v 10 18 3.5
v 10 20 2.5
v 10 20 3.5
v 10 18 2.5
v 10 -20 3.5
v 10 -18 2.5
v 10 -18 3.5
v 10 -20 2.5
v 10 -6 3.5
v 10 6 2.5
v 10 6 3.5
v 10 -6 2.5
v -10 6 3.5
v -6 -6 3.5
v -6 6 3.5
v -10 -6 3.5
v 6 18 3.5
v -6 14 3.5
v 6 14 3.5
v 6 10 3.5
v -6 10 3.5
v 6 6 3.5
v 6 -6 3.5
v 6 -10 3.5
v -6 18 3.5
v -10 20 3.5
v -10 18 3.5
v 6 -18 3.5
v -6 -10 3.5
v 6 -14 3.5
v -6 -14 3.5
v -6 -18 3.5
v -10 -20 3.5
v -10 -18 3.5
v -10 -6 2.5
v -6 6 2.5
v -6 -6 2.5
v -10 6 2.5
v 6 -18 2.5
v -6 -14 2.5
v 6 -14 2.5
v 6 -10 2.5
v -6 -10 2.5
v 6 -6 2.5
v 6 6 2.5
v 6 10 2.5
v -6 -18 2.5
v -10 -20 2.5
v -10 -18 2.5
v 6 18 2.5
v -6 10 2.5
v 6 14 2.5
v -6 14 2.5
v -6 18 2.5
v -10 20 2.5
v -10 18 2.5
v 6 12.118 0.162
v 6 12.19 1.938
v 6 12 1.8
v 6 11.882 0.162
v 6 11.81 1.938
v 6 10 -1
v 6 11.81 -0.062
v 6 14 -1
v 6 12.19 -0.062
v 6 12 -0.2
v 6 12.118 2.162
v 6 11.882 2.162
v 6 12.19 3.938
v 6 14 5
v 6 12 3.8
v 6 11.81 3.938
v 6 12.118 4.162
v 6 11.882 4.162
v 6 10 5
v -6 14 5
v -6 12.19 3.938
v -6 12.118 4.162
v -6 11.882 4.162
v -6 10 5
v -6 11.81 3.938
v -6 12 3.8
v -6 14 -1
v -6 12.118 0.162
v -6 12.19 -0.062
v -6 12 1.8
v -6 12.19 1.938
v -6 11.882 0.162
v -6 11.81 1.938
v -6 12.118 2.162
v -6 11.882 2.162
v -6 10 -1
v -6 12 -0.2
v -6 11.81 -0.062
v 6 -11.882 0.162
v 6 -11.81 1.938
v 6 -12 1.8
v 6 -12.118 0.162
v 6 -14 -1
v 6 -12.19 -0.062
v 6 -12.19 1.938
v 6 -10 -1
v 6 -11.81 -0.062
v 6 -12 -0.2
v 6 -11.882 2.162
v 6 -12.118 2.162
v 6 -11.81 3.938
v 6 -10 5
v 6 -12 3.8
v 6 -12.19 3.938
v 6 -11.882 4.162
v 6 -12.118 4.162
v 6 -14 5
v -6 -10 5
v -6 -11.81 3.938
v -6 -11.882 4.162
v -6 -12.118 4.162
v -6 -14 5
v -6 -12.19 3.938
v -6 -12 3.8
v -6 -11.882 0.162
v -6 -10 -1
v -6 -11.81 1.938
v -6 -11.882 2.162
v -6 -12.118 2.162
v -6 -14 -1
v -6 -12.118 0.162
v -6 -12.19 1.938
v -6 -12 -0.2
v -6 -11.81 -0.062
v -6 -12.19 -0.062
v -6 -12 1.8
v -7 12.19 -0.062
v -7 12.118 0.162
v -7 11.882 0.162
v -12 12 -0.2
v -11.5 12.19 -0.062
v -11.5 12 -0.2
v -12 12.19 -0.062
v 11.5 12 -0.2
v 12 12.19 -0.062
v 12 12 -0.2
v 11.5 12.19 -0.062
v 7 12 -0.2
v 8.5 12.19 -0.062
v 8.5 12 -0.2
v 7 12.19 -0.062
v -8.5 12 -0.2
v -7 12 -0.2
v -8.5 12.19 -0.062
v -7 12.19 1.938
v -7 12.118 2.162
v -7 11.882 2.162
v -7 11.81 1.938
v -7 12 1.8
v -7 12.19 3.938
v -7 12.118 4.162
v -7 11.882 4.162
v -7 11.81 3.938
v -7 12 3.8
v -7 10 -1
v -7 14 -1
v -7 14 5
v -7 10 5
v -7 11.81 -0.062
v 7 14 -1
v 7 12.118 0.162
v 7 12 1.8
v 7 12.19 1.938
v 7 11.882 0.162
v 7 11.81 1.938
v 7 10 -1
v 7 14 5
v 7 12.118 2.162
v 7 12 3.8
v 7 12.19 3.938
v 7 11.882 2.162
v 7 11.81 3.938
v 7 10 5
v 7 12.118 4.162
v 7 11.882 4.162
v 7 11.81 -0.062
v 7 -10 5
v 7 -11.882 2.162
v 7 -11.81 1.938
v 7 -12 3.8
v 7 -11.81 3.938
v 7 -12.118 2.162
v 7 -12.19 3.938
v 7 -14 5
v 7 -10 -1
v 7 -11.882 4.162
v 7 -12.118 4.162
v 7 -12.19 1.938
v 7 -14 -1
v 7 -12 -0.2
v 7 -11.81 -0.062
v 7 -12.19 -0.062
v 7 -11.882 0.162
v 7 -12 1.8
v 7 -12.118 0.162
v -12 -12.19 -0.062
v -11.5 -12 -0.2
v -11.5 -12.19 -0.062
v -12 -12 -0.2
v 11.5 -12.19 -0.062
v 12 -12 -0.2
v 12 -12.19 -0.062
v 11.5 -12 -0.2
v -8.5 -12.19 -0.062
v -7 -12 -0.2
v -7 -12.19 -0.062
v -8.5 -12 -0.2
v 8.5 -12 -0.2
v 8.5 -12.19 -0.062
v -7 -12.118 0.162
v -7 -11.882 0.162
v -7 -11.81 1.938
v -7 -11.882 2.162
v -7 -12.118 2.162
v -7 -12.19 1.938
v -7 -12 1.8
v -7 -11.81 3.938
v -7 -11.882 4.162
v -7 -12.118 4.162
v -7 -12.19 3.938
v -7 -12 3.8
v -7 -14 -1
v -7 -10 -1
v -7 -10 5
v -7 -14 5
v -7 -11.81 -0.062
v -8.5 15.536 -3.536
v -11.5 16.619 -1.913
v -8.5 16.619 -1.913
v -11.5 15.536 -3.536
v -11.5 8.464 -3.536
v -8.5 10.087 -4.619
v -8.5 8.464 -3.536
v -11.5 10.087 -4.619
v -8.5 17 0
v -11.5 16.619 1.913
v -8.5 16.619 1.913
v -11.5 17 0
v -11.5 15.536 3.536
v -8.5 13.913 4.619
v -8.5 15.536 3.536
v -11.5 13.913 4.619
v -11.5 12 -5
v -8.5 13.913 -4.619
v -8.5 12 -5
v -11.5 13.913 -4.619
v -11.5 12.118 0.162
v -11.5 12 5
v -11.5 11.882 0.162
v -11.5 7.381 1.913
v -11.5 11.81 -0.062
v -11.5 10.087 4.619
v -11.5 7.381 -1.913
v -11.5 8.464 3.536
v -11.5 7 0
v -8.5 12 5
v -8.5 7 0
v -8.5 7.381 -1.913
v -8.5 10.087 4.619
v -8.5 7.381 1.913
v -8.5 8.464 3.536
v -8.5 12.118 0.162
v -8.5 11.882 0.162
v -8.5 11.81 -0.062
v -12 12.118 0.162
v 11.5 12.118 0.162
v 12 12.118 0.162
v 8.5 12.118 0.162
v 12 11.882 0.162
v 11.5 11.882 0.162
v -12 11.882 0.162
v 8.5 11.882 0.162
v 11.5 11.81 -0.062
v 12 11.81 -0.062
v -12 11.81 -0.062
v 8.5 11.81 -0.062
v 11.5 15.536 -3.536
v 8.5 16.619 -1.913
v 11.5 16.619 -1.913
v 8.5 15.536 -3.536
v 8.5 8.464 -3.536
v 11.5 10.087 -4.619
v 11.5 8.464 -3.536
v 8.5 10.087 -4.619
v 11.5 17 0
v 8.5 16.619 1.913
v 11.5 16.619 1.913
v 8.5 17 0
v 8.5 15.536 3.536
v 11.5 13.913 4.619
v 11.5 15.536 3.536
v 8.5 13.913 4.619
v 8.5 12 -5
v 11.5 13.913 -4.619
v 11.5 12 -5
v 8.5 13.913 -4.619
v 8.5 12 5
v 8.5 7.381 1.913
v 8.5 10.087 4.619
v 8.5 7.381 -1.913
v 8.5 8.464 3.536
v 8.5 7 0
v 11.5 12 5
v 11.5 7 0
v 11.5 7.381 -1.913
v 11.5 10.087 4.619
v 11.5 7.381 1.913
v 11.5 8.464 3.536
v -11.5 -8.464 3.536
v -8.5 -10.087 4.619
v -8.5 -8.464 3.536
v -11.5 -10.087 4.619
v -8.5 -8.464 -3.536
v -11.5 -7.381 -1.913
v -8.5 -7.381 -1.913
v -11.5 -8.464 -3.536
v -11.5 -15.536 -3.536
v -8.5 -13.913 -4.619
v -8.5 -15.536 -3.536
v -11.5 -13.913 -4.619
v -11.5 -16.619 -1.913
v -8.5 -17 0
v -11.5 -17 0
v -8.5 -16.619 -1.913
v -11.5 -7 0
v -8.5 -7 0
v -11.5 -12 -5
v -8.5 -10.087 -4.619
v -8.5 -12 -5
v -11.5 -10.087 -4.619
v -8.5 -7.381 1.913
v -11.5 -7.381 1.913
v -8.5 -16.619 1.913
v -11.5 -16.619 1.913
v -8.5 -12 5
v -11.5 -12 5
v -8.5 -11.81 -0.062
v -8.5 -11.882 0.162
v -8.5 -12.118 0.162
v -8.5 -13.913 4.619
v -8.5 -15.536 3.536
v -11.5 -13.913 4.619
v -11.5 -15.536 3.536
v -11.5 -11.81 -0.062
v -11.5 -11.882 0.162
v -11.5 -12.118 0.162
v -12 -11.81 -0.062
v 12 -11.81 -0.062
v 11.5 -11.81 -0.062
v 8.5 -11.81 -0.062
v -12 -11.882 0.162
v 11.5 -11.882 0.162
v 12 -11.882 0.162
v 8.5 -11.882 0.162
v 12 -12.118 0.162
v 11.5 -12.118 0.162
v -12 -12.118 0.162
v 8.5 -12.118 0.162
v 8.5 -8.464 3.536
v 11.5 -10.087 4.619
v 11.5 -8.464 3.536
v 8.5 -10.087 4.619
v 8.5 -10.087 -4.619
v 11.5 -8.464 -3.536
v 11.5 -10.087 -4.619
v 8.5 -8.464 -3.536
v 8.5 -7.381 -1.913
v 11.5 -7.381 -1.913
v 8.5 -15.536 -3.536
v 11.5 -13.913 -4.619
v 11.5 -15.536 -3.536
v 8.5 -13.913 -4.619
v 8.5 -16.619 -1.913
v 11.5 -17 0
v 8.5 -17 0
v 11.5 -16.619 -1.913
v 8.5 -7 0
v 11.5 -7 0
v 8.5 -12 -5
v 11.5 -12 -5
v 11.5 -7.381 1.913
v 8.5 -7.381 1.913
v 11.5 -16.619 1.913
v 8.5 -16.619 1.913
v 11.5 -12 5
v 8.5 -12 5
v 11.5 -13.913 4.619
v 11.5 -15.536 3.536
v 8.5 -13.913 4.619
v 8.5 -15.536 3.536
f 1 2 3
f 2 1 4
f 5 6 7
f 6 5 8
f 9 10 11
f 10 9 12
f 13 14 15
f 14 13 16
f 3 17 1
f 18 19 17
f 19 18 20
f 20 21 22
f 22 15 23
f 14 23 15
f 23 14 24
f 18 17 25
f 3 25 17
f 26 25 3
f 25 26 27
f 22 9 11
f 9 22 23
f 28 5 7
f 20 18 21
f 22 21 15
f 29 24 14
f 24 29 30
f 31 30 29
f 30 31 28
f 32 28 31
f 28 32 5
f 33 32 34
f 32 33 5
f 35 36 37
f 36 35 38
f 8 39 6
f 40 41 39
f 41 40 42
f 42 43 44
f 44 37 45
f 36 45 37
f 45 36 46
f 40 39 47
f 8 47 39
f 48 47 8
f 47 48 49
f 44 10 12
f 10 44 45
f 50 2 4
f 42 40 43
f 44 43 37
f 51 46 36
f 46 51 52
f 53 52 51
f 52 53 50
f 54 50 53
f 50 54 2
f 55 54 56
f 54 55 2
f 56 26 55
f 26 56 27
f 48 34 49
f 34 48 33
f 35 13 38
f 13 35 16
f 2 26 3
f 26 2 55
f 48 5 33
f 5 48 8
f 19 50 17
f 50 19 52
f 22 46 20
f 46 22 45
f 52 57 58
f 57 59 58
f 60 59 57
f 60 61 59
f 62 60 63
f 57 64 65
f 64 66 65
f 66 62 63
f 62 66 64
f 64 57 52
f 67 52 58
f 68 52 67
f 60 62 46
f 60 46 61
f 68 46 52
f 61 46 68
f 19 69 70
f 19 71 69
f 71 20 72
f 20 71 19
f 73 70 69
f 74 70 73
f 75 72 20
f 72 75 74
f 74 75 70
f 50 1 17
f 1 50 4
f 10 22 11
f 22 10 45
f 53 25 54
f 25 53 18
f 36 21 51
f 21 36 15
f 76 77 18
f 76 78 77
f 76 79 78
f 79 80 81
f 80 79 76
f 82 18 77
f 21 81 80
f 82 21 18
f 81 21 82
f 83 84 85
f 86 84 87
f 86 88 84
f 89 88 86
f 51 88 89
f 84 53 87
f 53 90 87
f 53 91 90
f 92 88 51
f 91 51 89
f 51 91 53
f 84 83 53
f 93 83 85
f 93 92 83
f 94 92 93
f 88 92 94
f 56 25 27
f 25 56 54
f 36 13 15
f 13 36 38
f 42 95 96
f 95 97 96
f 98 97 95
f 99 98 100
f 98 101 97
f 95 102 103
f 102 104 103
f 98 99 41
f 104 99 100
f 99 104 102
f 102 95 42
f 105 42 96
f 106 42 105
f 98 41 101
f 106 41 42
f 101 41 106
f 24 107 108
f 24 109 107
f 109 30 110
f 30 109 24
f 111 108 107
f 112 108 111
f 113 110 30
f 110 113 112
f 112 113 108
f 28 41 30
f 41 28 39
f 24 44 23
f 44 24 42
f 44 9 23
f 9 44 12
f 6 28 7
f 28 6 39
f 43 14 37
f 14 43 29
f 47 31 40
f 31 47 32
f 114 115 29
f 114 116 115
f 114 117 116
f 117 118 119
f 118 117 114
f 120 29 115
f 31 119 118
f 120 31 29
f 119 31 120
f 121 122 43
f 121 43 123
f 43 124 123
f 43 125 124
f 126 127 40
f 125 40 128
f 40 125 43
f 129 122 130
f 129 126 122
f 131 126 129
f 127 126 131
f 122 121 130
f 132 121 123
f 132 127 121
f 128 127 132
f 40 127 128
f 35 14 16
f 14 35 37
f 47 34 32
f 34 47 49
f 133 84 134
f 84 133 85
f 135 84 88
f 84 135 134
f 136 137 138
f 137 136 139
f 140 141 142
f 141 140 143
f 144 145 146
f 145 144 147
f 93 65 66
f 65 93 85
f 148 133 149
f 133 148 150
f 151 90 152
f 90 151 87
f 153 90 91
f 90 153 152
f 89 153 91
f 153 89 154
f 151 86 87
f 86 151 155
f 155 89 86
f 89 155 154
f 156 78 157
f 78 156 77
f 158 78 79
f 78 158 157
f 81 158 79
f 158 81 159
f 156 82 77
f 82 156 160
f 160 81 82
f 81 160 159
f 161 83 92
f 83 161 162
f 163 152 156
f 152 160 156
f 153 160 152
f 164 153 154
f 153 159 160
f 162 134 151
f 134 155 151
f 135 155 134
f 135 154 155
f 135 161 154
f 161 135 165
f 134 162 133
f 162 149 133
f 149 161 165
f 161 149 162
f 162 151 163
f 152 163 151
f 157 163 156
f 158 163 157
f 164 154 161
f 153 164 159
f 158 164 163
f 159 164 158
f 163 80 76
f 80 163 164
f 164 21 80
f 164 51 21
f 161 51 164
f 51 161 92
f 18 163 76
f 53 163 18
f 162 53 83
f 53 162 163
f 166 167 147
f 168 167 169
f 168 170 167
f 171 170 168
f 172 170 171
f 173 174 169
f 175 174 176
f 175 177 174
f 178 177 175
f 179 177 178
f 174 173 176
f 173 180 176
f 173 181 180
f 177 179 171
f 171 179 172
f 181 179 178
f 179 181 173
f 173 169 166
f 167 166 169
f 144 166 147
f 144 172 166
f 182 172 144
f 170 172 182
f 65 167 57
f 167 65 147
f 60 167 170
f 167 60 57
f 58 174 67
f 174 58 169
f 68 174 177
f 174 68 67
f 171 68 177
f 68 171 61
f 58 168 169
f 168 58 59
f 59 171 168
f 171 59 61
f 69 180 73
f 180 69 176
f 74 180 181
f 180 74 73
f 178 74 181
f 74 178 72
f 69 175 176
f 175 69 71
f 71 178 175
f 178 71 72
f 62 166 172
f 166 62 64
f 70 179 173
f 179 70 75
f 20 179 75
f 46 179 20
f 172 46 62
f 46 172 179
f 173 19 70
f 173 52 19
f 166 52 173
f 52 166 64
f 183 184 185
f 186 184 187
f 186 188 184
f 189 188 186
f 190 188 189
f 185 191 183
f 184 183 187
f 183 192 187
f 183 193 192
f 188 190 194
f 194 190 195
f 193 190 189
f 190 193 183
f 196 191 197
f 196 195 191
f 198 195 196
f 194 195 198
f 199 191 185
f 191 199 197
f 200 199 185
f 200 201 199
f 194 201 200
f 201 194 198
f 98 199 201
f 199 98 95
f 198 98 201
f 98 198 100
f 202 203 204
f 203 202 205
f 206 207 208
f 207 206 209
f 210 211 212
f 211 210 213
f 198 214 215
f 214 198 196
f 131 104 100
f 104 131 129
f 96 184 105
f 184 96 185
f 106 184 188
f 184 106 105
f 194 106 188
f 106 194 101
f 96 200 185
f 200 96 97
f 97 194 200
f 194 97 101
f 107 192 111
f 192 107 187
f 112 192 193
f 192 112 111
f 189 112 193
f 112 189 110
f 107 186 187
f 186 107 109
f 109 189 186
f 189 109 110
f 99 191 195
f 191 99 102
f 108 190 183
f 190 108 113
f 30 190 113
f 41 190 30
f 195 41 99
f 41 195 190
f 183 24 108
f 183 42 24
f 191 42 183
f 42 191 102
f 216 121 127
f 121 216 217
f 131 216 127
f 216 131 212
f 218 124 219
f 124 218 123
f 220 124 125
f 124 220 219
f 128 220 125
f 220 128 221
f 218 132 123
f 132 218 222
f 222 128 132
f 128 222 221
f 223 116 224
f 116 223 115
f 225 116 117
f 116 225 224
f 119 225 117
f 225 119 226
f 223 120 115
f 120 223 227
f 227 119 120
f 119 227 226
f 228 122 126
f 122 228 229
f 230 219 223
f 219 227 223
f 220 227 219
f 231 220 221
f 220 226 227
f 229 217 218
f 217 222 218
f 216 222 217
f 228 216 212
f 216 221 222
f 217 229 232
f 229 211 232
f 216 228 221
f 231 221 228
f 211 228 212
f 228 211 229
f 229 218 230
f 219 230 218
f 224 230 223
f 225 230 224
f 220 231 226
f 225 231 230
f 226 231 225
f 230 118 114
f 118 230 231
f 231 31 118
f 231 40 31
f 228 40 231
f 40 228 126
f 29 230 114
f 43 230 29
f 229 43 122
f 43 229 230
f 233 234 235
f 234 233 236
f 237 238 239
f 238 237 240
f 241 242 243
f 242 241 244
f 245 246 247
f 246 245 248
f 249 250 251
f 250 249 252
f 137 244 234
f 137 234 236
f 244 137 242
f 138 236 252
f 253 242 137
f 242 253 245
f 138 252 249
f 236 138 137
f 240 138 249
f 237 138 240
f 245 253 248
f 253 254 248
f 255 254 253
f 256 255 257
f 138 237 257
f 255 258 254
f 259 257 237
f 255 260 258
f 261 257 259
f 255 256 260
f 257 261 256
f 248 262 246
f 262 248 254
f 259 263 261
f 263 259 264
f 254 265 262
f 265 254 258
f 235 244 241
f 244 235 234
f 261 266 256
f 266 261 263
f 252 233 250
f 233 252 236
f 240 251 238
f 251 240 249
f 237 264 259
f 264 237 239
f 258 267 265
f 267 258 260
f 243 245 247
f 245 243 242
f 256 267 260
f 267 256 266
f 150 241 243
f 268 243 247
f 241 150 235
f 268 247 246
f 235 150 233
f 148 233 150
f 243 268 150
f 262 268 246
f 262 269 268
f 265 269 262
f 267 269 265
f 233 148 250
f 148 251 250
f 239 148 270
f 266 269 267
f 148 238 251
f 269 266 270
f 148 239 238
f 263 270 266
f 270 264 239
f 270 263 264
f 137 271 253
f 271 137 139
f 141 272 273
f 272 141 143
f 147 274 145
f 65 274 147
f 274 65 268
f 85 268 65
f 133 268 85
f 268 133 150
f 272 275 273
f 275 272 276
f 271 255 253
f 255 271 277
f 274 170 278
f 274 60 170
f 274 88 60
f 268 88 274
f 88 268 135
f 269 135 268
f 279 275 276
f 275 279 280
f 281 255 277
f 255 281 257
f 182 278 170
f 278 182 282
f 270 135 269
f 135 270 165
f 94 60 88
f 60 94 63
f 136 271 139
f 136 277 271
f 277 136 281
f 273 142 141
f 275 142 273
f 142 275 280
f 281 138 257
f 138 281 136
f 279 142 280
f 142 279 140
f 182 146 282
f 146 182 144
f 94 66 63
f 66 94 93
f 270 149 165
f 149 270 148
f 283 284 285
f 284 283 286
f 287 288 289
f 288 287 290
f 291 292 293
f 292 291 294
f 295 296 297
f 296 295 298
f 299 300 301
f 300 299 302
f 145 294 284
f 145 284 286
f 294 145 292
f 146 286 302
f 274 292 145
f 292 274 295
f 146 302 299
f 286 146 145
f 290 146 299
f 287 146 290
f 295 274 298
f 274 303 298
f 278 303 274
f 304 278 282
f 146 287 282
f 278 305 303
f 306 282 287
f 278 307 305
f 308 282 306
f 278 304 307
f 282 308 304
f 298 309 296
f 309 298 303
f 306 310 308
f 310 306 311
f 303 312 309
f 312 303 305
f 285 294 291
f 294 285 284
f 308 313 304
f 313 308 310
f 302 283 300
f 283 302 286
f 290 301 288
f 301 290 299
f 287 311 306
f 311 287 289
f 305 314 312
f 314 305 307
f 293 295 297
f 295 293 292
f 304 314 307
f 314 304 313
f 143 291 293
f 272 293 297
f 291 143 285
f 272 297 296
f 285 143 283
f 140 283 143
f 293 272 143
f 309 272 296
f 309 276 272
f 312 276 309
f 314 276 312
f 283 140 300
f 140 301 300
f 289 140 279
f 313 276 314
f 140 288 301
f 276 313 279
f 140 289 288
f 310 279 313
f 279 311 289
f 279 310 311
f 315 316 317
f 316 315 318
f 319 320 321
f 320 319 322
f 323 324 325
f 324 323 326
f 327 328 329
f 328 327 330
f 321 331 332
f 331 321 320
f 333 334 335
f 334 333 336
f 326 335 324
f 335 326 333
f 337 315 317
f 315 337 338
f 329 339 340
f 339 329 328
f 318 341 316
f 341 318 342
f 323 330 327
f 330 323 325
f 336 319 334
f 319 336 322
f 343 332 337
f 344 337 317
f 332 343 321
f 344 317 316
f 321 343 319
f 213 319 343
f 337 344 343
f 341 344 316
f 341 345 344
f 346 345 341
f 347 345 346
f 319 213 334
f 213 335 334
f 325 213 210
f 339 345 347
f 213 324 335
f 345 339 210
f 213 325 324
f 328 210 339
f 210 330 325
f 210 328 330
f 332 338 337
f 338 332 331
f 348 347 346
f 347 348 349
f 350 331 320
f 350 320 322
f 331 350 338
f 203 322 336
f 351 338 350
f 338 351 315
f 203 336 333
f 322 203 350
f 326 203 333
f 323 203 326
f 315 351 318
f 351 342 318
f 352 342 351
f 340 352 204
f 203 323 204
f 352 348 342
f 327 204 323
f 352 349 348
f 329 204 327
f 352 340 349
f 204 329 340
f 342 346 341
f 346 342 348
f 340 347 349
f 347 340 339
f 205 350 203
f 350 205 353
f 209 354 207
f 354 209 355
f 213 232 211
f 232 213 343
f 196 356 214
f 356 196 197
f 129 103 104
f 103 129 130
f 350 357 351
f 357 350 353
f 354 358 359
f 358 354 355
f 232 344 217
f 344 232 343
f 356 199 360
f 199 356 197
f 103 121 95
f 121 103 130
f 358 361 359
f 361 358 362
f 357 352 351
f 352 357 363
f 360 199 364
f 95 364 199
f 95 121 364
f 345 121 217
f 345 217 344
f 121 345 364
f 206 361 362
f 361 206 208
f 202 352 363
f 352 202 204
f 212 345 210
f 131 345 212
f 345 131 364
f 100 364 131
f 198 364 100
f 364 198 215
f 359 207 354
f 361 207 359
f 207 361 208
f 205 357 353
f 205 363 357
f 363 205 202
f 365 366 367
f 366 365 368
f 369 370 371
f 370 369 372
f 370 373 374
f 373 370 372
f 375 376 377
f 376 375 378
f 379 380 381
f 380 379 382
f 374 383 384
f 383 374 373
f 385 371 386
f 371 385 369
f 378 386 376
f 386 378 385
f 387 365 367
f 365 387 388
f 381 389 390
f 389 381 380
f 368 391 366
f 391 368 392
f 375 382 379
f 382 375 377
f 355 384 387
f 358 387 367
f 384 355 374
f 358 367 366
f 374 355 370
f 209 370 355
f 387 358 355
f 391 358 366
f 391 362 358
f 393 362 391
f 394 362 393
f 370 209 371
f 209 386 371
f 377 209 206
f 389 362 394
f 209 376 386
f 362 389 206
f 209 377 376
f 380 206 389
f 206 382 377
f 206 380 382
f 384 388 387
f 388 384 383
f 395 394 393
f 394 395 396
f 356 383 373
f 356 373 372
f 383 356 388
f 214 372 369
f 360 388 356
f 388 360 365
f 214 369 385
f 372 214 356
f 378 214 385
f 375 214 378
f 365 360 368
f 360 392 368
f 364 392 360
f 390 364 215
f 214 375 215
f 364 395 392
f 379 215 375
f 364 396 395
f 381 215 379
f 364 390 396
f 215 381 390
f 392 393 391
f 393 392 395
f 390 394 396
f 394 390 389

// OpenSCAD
// file: components/scaffold.scad
module scaffold(h=12){
   color("green") 
    
   difference(){
       translate([0,-2,0])
       rotate([90,90,90])
       cube([6,4,1]);  
       
       for (a =[-h/2:5]){
          translate([-1,0,a*2+1])
          rotate([90,90,90])
          cylinder(2,0.2,0.2);
       }
      
   }
   
      
       
     

}

scaffold();
// file: components/shaft.scad
module shaft (t=[0,0,0],h=12){
   color("silver") 
   translate(t)
   rotate([90,90,90])
   cylinder(h,r=0.2,center=true);
}
 
 shaft();
// file: components/wheel.scad
module wheel(t=[0,0,0],width=2,height=3){
    color("#444")
    translate(t)
     rotate([90,90,90])
     cylinder(h=3, r=5, center=true);
}
wheel([0,0,0],2,3);
// file: components/frame.scad
module frame(width=20,height=40){
    difference(){
    
    cube([width,height,1],true);
    //左前
    translate([6,6,-1.5])
        cube([6,12,4]);
    //右前
    translate([-12,6,-1.5])
        cube([6,12,4]);

    //左后 
    translate([6,-18,-1.5])
        cube([6,12,4]);
    //右后
    translate([-12,-18,-1.5])
        cube([6,12,4]);
    }
}
frame(20,40);
// main file
use  <./components/frame.scad>;
use  <./components/wheel.scad>;
use  <./components/shaft.scad>;
use  <./components/scaffold.scad>;

translate([0,0,3])

//车架
frame(20,40);
//前驱动
wheel([-10,12,0]);
translate([-7,12,5])
scaffold();

shaft([0,12,0],24);

translate([6,12,5])
scaffold();
wheel([10,12,0]);
//后驱
wheel([-10,-12,0]);
translate([6,-12,5])
scaffold();
shaft([0,-12,0],24);
translate([-7,-12,5])
scaffold();
wheel([10,-12,0]);
